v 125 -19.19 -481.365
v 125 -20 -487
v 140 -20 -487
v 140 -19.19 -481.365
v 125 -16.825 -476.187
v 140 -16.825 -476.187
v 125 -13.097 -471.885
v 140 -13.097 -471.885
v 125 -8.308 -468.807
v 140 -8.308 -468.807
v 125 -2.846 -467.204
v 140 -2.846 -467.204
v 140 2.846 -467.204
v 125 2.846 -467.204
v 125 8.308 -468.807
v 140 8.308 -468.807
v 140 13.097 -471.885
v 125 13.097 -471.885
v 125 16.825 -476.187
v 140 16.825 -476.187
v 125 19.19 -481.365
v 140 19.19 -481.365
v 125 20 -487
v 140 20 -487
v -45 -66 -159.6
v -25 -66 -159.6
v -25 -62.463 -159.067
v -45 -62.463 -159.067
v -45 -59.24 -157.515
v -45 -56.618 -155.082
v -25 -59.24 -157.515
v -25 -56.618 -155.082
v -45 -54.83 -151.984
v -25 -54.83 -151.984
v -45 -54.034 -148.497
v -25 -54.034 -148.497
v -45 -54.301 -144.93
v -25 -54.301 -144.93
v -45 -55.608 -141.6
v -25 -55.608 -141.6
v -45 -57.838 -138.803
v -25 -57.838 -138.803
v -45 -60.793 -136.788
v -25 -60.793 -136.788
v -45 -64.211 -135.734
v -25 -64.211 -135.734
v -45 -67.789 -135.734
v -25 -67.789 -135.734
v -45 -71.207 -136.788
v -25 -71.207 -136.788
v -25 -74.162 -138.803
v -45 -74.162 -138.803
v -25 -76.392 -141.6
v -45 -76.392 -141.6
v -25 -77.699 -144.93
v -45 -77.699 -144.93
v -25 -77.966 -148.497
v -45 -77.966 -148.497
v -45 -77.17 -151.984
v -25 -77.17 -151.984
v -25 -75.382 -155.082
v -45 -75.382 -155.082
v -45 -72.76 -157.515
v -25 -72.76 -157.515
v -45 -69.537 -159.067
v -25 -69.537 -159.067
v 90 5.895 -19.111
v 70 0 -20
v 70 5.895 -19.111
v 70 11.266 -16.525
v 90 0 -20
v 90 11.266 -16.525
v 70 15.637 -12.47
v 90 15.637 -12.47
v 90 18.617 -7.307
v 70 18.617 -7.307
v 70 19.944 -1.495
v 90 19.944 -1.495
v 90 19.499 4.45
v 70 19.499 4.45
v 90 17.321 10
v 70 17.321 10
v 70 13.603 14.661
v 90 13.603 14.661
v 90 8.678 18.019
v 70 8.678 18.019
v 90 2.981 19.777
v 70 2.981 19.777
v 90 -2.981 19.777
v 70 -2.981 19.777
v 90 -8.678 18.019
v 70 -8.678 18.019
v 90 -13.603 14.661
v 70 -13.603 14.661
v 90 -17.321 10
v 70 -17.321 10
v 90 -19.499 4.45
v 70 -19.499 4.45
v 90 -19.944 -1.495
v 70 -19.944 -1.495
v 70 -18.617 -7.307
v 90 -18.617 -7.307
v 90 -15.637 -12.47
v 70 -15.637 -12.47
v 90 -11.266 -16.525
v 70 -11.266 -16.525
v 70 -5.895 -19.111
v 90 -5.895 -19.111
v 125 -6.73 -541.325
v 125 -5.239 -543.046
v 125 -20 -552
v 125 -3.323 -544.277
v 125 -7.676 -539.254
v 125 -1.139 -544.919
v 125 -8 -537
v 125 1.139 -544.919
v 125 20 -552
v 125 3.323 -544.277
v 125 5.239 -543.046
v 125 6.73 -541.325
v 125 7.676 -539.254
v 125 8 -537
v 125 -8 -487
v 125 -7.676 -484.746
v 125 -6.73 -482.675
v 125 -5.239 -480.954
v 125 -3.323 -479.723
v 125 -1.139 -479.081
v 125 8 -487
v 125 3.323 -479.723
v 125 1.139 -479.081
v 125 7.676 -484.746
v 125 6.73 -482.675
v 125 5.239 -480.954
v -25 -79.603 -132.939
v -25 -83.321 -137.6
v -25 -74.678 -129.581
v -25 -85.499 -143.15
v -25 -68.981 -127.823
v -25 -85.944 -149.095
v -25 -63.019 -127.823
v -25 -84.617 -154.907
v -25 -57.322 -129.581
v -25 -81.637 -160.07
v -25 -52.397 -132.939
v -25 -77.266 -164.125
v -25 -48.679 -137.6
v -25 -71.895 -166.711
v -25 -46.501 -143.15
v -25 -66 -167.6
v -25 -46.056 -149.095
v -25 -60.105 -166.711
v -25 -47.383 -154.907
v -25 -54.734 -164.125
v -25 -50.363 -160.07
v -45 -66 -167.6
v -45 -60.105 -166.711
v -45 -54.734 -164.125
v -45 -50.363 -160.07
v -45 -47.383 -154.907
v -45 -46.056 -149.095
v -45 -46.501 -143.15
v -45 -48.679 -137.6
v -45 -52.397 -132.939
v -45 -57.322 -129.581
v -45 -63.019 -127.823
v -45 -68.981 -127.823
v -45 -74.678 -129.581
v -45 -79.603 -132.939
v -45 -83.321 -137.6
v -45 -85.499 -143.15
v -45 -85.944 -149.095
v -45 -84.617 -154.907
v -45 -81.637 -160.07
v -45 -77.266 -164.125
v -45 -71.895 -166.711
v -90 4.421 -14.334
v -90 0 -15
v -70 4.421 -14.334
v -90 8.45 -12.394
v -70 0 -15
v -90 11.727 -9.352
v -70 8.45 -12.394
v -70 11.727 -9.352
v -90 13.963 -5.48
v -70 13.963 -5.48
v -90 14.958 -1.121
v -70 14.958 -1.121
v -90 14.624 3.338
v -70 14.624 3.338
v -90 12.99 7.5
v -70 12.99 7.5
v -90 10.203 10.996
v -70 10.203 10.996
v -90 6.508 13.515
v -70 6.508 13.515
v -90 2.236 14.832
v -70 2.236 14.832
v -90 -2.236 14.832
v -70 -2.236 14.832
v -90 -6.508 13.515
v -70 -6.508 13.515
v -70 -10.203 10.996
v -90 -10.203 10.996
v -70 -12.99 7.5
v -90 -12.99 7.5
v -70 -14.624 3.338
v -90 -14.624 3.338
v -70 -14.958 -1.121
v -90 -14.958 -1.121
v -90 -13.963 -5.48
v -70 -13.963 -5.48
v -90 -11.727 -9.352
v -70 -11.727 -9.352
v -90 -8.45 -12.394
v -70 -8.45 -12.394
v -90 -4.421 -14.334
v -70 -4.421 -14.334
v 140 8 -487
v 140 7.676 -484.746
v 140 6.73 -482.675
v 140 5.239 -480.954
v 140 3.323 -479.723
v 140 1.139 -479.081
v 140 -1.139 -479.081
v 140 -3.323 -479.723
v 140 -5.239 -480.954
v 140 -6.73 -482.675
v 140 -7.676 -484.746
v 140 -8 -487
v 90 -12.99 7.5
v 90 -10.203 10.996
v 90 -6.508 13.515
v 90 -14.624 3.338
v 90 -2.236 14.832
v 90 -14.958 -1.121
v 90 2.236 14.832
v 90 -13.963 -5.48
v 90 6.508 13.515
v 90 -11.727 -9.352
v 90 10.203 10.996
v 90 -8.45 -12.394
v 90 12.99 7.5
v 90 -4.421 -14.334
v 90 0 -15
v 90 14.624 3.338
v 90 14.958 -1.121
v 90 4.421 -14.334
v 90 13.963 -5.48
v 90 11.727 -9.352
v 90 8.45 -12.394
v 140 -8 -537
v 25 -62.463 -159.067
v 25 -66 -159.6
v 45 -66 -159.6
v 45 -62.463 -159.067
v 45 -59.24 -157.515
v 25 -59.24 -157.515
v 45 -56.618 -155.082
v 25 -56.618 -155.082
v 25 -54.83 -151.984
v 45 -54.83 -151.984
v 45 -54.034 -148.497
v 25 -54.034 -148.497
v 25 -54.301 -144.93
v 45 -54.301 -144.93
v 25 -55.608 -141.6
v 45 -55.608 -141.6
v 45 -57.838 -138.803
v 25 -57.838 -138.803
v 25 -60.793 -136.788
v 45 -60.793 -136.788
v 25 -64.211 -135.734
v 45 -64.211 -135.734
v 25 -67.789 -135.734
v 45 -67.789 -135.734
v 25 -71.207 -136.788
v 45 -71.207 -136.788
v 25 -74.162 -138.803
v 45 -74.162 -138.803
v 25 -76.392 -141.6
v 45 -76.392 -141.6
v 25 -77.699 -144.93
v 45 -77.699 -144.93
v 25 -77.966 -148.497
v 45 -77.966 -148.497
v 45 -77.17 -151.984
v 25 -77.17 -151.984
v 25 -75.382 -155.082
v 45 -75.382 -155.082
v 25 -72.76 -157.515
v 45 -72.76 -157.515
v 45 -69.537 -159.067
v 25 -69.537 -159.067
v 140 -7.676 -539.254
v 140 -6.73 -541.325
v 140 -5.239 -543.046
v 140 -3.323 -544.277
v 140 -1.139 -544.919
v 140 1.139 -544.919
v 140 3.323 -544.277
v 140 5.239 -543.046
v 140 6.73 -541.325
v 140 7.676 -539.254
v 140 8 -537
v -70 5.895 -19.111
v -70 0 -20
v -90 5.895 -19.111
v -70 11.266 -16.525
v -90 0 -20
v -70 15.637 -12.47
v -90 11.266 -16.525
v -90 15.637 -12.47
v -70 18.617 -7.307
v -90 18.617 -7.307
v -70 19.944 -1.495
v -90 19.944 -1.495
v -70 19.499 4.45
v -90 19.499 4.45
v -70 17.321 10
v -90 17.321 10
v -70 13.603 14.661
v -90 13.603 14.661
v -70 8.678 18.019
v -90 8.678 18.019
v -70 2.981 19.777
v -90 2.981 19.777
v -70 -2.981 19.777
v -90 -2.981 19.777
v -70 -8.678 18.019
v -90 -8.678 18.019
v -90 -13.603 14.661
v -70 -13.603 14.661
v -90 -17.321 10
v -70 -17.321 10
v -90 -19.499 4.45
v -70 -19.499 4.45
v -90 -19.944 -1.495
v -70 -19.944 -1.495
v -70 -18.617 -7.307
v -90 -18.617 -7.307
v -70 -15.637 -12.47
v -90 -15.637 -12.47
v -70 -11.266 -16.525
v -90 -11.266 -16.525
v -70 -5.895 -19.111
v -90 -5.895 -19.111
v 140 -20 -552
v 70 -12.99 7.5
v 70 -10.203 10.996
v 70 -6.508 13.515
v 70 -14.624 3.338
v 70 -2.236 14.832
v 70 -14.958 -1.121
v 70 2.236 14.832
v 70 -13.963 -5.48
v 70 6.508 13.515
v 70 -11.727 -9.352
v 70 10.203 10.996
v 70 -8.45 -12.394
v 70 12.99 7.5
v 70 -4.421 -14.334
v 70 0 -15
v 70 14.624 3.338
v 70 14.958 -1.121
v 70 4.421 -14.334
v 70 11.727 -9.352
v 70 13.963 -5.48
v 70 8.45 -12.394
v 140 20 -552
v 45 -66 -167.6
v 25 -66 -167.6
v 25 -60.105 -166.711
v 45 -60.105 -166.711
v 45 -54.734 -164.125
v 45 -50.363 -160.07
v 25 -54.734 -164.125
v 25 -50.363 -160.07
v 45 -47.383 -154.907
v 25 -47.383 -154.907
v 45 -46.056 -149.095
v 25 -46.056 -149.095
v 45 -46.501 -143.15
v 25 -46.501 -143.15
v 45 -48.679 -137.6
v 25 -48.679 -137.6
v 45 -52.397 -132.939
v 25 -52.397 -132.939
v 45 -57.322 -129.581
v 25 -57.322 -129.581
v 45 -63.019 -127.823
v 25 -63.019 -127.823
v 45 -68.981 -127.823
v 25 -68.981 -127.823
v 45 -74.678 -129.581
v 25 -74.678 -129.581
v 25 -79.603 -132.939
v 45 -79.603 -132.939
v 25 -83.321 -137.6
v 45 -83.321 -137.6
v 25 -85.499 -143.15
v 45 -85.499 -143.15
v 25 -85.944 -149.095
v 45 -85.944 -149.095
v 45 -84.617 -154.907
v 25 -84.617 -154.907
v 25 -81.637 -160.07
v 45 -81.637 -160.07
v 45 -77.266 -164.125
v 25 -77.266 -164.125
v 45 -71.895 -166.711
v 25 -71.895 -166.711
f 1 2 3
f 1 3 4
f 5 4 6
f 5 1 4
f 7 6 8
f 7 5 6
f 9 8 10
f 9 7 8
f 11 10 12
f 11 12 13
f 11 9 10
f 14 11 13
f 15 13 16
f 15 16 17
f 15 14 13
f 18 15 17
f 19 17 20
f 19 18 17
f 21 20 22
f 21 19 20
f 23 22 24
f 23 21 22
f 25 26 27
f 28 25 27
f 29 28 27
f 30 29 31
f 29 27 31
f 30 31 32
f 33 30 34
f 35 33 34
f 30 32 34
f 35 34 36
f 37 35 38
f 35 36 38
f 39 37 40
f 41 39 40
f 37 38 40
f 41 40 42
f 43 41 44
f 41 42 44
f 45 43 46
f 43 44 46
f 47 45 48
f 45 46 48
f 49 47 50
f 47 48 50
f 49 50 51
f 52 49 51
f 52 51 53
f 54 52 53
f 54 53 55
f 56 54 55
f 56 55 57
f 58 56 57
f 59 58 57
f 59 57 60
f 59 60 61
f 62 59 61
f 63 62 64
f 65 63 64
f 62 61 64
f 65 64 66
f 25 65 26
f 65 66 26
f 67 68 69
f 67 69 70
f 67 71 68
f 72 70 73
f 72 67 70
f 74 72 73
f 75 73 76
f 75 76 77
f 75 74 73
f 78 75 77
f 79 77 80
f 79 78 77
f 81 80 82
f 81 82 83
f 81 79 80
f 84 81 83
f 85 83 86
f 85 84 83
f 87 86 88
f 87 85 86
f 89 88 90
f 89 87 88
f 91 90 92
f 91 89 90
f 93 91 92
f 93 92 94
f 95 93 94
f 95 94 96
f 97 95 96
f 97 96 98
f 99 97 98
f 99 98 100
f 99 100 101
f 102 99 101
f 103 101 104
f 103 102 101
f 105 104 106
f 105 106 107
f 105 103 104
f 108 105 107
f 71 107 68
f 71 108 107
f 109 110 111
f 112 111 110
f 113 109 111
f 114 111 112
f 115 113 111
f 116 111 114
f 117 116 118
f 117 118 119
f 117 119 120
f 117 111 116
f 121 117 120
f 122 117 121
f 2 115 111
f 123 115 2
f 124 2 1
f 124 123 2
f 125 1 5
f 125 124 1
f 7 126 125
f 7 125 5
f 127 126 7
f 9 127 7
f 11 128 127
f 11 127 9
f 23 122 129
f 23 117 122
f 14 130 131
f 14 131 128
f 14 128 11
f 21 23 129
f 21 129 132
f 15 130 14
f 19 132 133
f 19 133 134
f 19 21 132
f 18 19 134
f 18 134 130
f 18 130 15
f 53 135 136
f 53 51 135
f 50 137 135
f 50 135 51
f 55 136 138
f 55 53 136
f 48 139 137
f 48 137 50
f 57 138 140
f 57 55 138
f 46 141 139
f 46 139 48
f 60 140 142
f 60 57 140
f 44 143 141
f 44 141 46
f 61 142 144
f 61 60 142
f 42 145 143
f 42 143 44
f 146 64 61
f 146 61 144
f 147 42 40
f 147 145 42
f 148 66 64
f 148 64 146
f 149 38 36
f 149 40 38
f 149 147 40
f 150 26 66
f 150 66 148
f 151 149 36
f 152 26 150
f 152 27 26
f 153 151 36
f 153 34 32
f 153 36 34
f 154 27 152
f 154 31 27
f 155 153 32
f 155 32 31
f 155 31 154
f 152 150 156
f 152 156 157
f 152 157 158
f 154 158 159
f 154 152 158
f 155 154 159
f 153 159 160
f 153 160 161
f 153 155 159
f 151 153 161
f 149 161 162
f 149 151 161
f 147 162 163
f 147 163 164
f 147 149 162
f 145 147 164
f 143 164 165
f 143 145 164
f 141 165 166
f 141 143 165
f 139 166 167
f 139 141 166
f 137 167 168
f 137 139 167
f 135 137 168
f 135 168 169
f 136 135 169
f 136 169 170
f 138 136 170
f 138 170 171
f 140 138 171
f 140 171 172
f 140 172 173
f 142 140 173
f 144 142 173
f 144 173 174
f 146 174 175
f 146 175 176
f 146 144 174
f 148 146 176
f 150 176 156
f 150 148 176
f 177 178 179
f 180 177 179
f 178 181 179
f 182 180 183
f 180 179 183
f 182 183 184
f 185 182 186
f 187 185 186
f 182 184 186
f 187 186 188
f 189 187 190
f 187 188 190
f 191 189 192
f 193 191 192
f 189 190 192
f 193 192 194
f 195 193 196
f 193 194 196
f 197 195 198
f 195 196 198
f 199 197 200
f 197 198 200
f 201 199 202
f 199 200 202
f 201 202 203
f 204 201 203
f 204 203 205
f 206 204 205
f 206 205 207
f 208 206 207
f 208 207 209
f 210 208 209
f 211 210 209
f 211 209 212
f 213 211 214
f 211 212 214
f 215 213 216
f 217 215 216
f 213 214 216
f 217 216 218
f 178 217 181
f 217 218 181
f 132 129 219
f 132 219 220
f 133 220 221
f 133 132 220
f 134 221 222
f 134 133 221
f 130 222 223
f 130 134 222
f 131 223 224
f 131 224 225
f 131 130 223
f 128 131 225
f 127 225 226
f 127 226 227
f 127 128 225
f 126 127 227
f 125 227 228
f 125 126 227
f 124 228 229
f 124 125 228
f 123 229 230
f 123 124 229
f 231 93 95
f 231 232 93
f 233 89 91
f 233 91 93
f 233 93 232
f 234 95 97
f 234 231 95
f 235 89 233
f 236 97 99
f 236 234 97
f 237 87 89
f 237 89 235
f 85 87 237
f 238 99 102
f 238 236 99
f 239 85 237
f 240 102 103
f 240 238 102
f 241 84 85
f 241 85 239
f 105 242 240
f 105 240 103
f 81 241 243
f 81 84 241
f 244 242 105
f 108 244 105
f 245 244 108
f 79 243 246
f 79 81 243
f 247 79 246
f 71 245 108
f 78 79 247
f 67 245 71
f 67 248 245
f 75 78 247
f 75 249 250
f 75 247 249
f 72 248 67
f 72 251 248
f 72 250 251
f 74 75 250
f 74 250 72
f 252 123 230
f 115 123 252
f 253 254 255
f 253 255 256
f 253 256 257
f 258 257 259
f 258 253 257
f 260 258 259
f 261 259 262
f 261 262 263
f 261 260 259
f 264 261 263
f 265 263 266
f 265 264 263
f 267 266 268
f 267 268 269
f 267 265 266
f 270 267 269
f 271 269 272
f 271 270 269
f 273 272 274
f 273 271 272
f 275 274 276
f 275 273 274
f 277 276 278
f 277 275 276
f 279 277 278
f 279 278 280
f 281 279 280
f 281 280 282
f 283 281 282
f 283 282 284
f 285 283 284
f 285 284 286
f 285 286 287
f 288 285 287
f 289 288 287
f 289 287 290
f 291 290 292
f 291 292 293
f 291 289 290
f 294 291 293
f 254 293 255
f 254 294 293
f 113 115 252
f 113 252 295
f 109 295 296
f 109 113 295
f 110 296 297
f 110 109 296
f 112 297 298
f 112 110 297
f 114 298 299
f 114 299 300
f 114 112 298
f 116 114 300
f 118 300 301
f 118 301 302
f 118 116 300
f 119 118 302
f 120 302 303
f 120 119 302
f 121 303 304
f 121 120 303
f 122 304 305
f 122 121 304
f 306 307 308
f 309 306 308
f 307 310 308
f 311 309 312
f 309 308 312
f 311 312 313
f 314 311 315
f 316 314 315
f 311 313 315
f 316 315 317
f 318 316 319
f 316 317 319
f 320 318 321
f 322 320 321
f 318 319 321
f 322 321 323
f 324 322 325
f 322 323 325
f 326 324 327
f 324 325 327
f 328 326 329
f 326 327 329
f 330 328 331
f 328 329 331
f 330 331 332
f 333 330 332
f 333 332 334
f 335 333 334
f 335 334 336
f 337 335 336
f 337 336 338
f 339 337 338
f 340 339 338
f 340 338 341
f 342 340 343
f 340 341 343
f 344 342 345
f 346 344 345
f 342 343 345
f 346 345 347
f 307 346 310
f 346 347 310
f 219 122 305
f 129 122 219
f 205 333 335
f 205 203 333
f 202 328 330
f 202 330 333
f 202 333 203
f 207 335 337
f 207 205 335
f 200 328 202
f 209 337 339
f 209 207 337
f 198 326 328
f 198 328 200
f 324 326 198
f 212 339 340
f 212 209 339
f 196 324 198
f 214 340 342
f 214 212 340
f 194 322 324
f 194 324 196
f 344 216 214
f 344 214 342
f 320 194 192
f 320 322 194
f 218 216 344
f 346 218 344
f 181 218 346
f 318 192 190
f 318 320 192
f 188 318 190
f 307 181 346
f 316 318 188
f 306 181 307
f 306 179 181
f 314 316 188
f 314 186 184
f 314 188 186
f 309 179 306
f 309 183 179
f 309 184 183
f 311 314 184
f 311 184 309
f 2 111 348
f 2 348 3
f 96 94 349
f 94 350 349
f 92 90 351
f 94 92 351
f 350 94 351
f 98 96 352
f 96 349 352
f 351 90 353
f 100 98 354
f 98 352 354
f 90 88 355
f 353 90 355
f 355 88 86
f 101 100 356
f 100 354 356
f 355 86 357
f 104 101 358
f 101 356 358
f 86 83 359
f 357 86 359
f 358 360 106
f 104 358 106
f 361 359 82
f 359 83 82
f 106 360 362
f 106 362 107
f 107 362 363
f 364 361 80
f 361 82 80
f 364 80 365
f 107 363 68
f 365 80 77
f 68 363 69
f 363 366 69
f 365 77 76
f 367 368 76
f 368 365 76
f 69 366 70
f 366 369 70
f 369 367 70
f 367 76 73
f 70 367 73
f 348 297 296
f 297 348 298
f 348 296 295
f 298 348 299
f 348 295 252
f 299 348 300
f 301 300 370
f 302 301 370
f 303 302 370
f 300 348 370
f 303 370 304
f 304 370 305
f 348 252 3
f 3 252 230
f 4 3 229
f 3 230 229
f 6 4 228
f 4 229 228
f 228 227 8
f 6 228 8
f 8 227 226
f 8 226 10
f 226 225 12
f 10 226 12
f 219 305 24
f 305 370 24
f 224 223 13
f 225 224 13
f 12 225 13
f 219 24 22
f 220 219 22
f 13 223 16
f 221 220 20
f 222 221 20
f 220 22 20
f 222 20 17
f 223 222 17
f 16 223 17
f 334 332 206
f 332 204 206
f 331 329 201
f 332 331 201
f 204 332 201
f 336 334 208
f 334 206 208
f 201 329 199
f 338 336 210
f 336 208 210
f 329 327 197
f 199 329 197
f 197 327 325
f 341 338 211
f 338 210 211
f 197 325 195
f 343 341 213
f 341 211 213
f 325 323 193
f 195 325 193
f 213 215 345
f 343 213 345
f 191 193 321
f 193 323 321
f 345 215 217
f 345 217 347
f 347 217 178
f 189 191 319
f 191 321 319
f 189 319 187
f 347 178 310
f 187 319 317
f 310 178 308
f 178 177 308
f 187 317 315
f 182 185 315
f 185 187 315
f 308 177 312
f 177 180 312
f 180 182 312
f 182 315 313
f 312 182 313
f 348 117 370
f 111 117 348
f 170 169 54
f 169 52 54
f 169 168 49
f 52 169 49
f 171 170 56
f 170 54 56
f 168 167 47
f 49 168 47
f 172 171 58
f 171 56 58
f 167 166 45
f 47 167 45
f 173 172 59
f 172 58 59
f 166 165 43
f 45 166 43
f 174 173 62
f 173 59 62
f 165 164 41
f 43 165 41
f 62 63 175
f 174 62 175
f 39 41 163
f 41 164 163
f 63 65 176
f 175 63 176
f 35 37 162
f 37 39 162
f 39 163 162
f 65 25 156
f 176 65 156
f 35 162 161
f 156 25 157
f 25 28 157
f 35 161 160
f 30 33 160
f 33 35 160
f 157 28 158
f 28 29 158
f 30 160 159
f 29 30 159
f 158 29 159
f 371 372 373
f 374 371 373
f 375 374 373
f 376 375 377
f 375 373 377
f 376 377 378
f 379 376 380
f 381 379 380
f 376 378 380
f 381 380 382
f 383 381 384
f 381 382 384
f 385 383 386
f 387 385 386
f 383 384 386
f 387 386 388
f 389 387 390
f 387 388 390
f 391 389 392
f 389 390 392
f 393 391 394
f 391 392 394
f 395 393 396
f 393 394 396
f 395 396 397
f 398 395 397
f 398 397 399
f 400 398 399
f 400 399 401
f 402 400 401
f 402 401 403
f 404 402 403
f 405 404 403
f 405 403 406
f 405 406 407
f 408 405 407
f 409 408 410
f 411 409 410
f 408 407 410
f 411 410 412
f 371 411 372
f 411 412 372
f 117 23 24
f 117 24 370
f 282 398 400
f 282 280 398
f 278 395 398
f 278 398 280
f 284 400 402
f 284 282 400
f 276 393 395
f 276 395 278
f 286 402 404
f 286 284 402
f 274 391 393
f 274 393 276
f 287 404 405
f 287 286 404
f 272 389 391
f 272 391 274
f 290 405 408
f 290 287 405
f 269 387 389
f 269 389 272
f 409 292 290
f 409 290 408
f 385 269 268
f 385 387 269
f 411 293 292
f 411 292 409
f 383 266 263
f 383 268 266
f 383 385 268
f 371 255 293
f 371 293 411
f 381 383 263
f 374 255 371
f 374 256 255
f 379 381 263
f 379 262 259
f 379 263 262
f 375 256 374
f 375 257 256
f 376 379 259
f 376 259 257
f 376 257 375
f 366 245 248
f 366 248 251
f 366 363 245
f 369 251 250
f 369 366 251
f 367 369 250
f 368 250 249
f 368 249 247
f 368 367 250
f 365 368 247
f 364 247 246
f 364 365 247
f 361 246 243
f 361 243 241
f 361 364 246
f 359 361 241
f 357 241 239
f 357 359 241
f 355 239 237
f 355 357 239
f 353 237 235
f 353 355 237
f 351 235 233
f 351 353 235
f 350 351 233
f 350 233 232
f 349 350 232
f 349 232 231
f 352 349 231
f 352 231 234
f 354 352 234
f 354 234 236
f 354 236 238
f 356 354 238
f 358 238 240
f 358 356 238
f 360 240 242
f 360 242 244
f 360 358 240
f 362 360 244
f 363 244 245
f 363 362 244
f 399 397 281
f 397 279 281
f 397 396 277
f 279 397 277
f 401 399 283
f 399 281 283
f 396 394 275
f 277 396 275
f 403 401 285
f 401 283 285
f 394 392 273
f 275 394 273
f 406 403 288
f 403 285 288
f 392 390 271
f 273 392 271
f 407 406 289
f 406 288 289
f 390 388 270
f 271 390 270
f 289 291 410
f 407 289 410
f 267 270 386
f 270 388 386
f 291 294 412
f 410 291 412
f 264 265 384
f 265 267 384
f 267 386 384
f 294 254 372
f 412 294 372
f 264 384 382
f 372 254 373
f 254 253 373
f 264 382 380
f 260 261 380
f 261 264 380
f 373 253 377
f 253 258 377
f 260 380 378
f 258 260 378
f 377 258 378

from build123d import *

# Parameters (mm, degrees)
RAMA_START               = -55
SZKIC_INSERT_RAMA_R      = 20
SZKIC_INSERT_RAMA_R_2    = 15
RAMA_DEPTH               = 10
LINKAGE_START            = 25
SZKIC_INSERT_LINKAGE_R   = 20
SZKIC_INSERT_LINKAGE_R_2 = 12
LINKAGE_DEPTH            = 20
TYLNE_KO_O_DEPTH         = 15


with BuildPart() as part:
    # Szkic - insert - rama → Rama (new, symmetric)
    with BuildSketch(Plane(origin=(135, 0, 0), x_dir=(0, 0, -1), z_dir=(1, 0, 0)).offset(RAMA_START)):
        Circle(SZKIC_INSERT_RAMA_R)
        Circle(SZKIC_INSERT_RAMA_R_2, mode=Mode.SUBTRACT)
    extrude(amount=RAMA_DEPTH, both=True)


with BuildPart() as body_2:
    # Szkic - insert - linkage → Linkage (new body)
    with BuildSketch(Plane(origin=(0, 0, 0), x_dir=(0, 0, -1), z_dir=(1, 0, 0)).offset(LINKAGE_START)):
        with Locations((147.6, -66)):
            Circle(SZKIC_INSERT_LINKAGE_R)
        with Locations((147.6, -66)):
            Circle(SZKIC_INSERT_LINKAGE_R_2, mode=Mode.SUBTRACT)
    extrude(amount=LINKAGE_DEPTH)


with BuildPart() as body_3:
    # Szkic - insert - tylne koło → Tylne koło (new body)
    with BuildSketch(Plane(origin=(125, 0, 0), x_dir=(0, 0, -1), z_dir=(1, 0, 0))):
        with BuildLine():
            Line((487, 20), (552, 20))
            Line((552, 20), (552, -20))
            Line((552, -20), (487, -20))
            ThreePointArc((487, -20), (467, 0), (487, 20))
        make_face()
        with BuildLine():
            Line((537, 8), (487, 8))
            ThreePointArc((487, 8), (479, 0), (487, -8))
            Line((487, -8), (537, -8))
            ThreePointArc((537, -8), (545, 0), (537, 8))
        make_face(mode=Mode.SUBTRACT)
    extrude(amount=TYLNE_KO_O_DEPTH)


with BuildPart() as body_4:
    # Lustro3: mirrored copy
    add(part.part.mirror(Plane(origin=(0, 0, 0), x_dir=(0, 0, 1), z_dir=(1, 0, 0))))


with BuildPart() as body_5:
    # Lustro3 2: mirrored copy
    add(body_2.part.mirror(Plane(origin=(0, 0, 0), x_dir=(0, 0, 1), z_dir=(1, 0, 0))))


solid = Compound([part.part, body_2.part, body_3.part, body_4.part, body_5.part])
